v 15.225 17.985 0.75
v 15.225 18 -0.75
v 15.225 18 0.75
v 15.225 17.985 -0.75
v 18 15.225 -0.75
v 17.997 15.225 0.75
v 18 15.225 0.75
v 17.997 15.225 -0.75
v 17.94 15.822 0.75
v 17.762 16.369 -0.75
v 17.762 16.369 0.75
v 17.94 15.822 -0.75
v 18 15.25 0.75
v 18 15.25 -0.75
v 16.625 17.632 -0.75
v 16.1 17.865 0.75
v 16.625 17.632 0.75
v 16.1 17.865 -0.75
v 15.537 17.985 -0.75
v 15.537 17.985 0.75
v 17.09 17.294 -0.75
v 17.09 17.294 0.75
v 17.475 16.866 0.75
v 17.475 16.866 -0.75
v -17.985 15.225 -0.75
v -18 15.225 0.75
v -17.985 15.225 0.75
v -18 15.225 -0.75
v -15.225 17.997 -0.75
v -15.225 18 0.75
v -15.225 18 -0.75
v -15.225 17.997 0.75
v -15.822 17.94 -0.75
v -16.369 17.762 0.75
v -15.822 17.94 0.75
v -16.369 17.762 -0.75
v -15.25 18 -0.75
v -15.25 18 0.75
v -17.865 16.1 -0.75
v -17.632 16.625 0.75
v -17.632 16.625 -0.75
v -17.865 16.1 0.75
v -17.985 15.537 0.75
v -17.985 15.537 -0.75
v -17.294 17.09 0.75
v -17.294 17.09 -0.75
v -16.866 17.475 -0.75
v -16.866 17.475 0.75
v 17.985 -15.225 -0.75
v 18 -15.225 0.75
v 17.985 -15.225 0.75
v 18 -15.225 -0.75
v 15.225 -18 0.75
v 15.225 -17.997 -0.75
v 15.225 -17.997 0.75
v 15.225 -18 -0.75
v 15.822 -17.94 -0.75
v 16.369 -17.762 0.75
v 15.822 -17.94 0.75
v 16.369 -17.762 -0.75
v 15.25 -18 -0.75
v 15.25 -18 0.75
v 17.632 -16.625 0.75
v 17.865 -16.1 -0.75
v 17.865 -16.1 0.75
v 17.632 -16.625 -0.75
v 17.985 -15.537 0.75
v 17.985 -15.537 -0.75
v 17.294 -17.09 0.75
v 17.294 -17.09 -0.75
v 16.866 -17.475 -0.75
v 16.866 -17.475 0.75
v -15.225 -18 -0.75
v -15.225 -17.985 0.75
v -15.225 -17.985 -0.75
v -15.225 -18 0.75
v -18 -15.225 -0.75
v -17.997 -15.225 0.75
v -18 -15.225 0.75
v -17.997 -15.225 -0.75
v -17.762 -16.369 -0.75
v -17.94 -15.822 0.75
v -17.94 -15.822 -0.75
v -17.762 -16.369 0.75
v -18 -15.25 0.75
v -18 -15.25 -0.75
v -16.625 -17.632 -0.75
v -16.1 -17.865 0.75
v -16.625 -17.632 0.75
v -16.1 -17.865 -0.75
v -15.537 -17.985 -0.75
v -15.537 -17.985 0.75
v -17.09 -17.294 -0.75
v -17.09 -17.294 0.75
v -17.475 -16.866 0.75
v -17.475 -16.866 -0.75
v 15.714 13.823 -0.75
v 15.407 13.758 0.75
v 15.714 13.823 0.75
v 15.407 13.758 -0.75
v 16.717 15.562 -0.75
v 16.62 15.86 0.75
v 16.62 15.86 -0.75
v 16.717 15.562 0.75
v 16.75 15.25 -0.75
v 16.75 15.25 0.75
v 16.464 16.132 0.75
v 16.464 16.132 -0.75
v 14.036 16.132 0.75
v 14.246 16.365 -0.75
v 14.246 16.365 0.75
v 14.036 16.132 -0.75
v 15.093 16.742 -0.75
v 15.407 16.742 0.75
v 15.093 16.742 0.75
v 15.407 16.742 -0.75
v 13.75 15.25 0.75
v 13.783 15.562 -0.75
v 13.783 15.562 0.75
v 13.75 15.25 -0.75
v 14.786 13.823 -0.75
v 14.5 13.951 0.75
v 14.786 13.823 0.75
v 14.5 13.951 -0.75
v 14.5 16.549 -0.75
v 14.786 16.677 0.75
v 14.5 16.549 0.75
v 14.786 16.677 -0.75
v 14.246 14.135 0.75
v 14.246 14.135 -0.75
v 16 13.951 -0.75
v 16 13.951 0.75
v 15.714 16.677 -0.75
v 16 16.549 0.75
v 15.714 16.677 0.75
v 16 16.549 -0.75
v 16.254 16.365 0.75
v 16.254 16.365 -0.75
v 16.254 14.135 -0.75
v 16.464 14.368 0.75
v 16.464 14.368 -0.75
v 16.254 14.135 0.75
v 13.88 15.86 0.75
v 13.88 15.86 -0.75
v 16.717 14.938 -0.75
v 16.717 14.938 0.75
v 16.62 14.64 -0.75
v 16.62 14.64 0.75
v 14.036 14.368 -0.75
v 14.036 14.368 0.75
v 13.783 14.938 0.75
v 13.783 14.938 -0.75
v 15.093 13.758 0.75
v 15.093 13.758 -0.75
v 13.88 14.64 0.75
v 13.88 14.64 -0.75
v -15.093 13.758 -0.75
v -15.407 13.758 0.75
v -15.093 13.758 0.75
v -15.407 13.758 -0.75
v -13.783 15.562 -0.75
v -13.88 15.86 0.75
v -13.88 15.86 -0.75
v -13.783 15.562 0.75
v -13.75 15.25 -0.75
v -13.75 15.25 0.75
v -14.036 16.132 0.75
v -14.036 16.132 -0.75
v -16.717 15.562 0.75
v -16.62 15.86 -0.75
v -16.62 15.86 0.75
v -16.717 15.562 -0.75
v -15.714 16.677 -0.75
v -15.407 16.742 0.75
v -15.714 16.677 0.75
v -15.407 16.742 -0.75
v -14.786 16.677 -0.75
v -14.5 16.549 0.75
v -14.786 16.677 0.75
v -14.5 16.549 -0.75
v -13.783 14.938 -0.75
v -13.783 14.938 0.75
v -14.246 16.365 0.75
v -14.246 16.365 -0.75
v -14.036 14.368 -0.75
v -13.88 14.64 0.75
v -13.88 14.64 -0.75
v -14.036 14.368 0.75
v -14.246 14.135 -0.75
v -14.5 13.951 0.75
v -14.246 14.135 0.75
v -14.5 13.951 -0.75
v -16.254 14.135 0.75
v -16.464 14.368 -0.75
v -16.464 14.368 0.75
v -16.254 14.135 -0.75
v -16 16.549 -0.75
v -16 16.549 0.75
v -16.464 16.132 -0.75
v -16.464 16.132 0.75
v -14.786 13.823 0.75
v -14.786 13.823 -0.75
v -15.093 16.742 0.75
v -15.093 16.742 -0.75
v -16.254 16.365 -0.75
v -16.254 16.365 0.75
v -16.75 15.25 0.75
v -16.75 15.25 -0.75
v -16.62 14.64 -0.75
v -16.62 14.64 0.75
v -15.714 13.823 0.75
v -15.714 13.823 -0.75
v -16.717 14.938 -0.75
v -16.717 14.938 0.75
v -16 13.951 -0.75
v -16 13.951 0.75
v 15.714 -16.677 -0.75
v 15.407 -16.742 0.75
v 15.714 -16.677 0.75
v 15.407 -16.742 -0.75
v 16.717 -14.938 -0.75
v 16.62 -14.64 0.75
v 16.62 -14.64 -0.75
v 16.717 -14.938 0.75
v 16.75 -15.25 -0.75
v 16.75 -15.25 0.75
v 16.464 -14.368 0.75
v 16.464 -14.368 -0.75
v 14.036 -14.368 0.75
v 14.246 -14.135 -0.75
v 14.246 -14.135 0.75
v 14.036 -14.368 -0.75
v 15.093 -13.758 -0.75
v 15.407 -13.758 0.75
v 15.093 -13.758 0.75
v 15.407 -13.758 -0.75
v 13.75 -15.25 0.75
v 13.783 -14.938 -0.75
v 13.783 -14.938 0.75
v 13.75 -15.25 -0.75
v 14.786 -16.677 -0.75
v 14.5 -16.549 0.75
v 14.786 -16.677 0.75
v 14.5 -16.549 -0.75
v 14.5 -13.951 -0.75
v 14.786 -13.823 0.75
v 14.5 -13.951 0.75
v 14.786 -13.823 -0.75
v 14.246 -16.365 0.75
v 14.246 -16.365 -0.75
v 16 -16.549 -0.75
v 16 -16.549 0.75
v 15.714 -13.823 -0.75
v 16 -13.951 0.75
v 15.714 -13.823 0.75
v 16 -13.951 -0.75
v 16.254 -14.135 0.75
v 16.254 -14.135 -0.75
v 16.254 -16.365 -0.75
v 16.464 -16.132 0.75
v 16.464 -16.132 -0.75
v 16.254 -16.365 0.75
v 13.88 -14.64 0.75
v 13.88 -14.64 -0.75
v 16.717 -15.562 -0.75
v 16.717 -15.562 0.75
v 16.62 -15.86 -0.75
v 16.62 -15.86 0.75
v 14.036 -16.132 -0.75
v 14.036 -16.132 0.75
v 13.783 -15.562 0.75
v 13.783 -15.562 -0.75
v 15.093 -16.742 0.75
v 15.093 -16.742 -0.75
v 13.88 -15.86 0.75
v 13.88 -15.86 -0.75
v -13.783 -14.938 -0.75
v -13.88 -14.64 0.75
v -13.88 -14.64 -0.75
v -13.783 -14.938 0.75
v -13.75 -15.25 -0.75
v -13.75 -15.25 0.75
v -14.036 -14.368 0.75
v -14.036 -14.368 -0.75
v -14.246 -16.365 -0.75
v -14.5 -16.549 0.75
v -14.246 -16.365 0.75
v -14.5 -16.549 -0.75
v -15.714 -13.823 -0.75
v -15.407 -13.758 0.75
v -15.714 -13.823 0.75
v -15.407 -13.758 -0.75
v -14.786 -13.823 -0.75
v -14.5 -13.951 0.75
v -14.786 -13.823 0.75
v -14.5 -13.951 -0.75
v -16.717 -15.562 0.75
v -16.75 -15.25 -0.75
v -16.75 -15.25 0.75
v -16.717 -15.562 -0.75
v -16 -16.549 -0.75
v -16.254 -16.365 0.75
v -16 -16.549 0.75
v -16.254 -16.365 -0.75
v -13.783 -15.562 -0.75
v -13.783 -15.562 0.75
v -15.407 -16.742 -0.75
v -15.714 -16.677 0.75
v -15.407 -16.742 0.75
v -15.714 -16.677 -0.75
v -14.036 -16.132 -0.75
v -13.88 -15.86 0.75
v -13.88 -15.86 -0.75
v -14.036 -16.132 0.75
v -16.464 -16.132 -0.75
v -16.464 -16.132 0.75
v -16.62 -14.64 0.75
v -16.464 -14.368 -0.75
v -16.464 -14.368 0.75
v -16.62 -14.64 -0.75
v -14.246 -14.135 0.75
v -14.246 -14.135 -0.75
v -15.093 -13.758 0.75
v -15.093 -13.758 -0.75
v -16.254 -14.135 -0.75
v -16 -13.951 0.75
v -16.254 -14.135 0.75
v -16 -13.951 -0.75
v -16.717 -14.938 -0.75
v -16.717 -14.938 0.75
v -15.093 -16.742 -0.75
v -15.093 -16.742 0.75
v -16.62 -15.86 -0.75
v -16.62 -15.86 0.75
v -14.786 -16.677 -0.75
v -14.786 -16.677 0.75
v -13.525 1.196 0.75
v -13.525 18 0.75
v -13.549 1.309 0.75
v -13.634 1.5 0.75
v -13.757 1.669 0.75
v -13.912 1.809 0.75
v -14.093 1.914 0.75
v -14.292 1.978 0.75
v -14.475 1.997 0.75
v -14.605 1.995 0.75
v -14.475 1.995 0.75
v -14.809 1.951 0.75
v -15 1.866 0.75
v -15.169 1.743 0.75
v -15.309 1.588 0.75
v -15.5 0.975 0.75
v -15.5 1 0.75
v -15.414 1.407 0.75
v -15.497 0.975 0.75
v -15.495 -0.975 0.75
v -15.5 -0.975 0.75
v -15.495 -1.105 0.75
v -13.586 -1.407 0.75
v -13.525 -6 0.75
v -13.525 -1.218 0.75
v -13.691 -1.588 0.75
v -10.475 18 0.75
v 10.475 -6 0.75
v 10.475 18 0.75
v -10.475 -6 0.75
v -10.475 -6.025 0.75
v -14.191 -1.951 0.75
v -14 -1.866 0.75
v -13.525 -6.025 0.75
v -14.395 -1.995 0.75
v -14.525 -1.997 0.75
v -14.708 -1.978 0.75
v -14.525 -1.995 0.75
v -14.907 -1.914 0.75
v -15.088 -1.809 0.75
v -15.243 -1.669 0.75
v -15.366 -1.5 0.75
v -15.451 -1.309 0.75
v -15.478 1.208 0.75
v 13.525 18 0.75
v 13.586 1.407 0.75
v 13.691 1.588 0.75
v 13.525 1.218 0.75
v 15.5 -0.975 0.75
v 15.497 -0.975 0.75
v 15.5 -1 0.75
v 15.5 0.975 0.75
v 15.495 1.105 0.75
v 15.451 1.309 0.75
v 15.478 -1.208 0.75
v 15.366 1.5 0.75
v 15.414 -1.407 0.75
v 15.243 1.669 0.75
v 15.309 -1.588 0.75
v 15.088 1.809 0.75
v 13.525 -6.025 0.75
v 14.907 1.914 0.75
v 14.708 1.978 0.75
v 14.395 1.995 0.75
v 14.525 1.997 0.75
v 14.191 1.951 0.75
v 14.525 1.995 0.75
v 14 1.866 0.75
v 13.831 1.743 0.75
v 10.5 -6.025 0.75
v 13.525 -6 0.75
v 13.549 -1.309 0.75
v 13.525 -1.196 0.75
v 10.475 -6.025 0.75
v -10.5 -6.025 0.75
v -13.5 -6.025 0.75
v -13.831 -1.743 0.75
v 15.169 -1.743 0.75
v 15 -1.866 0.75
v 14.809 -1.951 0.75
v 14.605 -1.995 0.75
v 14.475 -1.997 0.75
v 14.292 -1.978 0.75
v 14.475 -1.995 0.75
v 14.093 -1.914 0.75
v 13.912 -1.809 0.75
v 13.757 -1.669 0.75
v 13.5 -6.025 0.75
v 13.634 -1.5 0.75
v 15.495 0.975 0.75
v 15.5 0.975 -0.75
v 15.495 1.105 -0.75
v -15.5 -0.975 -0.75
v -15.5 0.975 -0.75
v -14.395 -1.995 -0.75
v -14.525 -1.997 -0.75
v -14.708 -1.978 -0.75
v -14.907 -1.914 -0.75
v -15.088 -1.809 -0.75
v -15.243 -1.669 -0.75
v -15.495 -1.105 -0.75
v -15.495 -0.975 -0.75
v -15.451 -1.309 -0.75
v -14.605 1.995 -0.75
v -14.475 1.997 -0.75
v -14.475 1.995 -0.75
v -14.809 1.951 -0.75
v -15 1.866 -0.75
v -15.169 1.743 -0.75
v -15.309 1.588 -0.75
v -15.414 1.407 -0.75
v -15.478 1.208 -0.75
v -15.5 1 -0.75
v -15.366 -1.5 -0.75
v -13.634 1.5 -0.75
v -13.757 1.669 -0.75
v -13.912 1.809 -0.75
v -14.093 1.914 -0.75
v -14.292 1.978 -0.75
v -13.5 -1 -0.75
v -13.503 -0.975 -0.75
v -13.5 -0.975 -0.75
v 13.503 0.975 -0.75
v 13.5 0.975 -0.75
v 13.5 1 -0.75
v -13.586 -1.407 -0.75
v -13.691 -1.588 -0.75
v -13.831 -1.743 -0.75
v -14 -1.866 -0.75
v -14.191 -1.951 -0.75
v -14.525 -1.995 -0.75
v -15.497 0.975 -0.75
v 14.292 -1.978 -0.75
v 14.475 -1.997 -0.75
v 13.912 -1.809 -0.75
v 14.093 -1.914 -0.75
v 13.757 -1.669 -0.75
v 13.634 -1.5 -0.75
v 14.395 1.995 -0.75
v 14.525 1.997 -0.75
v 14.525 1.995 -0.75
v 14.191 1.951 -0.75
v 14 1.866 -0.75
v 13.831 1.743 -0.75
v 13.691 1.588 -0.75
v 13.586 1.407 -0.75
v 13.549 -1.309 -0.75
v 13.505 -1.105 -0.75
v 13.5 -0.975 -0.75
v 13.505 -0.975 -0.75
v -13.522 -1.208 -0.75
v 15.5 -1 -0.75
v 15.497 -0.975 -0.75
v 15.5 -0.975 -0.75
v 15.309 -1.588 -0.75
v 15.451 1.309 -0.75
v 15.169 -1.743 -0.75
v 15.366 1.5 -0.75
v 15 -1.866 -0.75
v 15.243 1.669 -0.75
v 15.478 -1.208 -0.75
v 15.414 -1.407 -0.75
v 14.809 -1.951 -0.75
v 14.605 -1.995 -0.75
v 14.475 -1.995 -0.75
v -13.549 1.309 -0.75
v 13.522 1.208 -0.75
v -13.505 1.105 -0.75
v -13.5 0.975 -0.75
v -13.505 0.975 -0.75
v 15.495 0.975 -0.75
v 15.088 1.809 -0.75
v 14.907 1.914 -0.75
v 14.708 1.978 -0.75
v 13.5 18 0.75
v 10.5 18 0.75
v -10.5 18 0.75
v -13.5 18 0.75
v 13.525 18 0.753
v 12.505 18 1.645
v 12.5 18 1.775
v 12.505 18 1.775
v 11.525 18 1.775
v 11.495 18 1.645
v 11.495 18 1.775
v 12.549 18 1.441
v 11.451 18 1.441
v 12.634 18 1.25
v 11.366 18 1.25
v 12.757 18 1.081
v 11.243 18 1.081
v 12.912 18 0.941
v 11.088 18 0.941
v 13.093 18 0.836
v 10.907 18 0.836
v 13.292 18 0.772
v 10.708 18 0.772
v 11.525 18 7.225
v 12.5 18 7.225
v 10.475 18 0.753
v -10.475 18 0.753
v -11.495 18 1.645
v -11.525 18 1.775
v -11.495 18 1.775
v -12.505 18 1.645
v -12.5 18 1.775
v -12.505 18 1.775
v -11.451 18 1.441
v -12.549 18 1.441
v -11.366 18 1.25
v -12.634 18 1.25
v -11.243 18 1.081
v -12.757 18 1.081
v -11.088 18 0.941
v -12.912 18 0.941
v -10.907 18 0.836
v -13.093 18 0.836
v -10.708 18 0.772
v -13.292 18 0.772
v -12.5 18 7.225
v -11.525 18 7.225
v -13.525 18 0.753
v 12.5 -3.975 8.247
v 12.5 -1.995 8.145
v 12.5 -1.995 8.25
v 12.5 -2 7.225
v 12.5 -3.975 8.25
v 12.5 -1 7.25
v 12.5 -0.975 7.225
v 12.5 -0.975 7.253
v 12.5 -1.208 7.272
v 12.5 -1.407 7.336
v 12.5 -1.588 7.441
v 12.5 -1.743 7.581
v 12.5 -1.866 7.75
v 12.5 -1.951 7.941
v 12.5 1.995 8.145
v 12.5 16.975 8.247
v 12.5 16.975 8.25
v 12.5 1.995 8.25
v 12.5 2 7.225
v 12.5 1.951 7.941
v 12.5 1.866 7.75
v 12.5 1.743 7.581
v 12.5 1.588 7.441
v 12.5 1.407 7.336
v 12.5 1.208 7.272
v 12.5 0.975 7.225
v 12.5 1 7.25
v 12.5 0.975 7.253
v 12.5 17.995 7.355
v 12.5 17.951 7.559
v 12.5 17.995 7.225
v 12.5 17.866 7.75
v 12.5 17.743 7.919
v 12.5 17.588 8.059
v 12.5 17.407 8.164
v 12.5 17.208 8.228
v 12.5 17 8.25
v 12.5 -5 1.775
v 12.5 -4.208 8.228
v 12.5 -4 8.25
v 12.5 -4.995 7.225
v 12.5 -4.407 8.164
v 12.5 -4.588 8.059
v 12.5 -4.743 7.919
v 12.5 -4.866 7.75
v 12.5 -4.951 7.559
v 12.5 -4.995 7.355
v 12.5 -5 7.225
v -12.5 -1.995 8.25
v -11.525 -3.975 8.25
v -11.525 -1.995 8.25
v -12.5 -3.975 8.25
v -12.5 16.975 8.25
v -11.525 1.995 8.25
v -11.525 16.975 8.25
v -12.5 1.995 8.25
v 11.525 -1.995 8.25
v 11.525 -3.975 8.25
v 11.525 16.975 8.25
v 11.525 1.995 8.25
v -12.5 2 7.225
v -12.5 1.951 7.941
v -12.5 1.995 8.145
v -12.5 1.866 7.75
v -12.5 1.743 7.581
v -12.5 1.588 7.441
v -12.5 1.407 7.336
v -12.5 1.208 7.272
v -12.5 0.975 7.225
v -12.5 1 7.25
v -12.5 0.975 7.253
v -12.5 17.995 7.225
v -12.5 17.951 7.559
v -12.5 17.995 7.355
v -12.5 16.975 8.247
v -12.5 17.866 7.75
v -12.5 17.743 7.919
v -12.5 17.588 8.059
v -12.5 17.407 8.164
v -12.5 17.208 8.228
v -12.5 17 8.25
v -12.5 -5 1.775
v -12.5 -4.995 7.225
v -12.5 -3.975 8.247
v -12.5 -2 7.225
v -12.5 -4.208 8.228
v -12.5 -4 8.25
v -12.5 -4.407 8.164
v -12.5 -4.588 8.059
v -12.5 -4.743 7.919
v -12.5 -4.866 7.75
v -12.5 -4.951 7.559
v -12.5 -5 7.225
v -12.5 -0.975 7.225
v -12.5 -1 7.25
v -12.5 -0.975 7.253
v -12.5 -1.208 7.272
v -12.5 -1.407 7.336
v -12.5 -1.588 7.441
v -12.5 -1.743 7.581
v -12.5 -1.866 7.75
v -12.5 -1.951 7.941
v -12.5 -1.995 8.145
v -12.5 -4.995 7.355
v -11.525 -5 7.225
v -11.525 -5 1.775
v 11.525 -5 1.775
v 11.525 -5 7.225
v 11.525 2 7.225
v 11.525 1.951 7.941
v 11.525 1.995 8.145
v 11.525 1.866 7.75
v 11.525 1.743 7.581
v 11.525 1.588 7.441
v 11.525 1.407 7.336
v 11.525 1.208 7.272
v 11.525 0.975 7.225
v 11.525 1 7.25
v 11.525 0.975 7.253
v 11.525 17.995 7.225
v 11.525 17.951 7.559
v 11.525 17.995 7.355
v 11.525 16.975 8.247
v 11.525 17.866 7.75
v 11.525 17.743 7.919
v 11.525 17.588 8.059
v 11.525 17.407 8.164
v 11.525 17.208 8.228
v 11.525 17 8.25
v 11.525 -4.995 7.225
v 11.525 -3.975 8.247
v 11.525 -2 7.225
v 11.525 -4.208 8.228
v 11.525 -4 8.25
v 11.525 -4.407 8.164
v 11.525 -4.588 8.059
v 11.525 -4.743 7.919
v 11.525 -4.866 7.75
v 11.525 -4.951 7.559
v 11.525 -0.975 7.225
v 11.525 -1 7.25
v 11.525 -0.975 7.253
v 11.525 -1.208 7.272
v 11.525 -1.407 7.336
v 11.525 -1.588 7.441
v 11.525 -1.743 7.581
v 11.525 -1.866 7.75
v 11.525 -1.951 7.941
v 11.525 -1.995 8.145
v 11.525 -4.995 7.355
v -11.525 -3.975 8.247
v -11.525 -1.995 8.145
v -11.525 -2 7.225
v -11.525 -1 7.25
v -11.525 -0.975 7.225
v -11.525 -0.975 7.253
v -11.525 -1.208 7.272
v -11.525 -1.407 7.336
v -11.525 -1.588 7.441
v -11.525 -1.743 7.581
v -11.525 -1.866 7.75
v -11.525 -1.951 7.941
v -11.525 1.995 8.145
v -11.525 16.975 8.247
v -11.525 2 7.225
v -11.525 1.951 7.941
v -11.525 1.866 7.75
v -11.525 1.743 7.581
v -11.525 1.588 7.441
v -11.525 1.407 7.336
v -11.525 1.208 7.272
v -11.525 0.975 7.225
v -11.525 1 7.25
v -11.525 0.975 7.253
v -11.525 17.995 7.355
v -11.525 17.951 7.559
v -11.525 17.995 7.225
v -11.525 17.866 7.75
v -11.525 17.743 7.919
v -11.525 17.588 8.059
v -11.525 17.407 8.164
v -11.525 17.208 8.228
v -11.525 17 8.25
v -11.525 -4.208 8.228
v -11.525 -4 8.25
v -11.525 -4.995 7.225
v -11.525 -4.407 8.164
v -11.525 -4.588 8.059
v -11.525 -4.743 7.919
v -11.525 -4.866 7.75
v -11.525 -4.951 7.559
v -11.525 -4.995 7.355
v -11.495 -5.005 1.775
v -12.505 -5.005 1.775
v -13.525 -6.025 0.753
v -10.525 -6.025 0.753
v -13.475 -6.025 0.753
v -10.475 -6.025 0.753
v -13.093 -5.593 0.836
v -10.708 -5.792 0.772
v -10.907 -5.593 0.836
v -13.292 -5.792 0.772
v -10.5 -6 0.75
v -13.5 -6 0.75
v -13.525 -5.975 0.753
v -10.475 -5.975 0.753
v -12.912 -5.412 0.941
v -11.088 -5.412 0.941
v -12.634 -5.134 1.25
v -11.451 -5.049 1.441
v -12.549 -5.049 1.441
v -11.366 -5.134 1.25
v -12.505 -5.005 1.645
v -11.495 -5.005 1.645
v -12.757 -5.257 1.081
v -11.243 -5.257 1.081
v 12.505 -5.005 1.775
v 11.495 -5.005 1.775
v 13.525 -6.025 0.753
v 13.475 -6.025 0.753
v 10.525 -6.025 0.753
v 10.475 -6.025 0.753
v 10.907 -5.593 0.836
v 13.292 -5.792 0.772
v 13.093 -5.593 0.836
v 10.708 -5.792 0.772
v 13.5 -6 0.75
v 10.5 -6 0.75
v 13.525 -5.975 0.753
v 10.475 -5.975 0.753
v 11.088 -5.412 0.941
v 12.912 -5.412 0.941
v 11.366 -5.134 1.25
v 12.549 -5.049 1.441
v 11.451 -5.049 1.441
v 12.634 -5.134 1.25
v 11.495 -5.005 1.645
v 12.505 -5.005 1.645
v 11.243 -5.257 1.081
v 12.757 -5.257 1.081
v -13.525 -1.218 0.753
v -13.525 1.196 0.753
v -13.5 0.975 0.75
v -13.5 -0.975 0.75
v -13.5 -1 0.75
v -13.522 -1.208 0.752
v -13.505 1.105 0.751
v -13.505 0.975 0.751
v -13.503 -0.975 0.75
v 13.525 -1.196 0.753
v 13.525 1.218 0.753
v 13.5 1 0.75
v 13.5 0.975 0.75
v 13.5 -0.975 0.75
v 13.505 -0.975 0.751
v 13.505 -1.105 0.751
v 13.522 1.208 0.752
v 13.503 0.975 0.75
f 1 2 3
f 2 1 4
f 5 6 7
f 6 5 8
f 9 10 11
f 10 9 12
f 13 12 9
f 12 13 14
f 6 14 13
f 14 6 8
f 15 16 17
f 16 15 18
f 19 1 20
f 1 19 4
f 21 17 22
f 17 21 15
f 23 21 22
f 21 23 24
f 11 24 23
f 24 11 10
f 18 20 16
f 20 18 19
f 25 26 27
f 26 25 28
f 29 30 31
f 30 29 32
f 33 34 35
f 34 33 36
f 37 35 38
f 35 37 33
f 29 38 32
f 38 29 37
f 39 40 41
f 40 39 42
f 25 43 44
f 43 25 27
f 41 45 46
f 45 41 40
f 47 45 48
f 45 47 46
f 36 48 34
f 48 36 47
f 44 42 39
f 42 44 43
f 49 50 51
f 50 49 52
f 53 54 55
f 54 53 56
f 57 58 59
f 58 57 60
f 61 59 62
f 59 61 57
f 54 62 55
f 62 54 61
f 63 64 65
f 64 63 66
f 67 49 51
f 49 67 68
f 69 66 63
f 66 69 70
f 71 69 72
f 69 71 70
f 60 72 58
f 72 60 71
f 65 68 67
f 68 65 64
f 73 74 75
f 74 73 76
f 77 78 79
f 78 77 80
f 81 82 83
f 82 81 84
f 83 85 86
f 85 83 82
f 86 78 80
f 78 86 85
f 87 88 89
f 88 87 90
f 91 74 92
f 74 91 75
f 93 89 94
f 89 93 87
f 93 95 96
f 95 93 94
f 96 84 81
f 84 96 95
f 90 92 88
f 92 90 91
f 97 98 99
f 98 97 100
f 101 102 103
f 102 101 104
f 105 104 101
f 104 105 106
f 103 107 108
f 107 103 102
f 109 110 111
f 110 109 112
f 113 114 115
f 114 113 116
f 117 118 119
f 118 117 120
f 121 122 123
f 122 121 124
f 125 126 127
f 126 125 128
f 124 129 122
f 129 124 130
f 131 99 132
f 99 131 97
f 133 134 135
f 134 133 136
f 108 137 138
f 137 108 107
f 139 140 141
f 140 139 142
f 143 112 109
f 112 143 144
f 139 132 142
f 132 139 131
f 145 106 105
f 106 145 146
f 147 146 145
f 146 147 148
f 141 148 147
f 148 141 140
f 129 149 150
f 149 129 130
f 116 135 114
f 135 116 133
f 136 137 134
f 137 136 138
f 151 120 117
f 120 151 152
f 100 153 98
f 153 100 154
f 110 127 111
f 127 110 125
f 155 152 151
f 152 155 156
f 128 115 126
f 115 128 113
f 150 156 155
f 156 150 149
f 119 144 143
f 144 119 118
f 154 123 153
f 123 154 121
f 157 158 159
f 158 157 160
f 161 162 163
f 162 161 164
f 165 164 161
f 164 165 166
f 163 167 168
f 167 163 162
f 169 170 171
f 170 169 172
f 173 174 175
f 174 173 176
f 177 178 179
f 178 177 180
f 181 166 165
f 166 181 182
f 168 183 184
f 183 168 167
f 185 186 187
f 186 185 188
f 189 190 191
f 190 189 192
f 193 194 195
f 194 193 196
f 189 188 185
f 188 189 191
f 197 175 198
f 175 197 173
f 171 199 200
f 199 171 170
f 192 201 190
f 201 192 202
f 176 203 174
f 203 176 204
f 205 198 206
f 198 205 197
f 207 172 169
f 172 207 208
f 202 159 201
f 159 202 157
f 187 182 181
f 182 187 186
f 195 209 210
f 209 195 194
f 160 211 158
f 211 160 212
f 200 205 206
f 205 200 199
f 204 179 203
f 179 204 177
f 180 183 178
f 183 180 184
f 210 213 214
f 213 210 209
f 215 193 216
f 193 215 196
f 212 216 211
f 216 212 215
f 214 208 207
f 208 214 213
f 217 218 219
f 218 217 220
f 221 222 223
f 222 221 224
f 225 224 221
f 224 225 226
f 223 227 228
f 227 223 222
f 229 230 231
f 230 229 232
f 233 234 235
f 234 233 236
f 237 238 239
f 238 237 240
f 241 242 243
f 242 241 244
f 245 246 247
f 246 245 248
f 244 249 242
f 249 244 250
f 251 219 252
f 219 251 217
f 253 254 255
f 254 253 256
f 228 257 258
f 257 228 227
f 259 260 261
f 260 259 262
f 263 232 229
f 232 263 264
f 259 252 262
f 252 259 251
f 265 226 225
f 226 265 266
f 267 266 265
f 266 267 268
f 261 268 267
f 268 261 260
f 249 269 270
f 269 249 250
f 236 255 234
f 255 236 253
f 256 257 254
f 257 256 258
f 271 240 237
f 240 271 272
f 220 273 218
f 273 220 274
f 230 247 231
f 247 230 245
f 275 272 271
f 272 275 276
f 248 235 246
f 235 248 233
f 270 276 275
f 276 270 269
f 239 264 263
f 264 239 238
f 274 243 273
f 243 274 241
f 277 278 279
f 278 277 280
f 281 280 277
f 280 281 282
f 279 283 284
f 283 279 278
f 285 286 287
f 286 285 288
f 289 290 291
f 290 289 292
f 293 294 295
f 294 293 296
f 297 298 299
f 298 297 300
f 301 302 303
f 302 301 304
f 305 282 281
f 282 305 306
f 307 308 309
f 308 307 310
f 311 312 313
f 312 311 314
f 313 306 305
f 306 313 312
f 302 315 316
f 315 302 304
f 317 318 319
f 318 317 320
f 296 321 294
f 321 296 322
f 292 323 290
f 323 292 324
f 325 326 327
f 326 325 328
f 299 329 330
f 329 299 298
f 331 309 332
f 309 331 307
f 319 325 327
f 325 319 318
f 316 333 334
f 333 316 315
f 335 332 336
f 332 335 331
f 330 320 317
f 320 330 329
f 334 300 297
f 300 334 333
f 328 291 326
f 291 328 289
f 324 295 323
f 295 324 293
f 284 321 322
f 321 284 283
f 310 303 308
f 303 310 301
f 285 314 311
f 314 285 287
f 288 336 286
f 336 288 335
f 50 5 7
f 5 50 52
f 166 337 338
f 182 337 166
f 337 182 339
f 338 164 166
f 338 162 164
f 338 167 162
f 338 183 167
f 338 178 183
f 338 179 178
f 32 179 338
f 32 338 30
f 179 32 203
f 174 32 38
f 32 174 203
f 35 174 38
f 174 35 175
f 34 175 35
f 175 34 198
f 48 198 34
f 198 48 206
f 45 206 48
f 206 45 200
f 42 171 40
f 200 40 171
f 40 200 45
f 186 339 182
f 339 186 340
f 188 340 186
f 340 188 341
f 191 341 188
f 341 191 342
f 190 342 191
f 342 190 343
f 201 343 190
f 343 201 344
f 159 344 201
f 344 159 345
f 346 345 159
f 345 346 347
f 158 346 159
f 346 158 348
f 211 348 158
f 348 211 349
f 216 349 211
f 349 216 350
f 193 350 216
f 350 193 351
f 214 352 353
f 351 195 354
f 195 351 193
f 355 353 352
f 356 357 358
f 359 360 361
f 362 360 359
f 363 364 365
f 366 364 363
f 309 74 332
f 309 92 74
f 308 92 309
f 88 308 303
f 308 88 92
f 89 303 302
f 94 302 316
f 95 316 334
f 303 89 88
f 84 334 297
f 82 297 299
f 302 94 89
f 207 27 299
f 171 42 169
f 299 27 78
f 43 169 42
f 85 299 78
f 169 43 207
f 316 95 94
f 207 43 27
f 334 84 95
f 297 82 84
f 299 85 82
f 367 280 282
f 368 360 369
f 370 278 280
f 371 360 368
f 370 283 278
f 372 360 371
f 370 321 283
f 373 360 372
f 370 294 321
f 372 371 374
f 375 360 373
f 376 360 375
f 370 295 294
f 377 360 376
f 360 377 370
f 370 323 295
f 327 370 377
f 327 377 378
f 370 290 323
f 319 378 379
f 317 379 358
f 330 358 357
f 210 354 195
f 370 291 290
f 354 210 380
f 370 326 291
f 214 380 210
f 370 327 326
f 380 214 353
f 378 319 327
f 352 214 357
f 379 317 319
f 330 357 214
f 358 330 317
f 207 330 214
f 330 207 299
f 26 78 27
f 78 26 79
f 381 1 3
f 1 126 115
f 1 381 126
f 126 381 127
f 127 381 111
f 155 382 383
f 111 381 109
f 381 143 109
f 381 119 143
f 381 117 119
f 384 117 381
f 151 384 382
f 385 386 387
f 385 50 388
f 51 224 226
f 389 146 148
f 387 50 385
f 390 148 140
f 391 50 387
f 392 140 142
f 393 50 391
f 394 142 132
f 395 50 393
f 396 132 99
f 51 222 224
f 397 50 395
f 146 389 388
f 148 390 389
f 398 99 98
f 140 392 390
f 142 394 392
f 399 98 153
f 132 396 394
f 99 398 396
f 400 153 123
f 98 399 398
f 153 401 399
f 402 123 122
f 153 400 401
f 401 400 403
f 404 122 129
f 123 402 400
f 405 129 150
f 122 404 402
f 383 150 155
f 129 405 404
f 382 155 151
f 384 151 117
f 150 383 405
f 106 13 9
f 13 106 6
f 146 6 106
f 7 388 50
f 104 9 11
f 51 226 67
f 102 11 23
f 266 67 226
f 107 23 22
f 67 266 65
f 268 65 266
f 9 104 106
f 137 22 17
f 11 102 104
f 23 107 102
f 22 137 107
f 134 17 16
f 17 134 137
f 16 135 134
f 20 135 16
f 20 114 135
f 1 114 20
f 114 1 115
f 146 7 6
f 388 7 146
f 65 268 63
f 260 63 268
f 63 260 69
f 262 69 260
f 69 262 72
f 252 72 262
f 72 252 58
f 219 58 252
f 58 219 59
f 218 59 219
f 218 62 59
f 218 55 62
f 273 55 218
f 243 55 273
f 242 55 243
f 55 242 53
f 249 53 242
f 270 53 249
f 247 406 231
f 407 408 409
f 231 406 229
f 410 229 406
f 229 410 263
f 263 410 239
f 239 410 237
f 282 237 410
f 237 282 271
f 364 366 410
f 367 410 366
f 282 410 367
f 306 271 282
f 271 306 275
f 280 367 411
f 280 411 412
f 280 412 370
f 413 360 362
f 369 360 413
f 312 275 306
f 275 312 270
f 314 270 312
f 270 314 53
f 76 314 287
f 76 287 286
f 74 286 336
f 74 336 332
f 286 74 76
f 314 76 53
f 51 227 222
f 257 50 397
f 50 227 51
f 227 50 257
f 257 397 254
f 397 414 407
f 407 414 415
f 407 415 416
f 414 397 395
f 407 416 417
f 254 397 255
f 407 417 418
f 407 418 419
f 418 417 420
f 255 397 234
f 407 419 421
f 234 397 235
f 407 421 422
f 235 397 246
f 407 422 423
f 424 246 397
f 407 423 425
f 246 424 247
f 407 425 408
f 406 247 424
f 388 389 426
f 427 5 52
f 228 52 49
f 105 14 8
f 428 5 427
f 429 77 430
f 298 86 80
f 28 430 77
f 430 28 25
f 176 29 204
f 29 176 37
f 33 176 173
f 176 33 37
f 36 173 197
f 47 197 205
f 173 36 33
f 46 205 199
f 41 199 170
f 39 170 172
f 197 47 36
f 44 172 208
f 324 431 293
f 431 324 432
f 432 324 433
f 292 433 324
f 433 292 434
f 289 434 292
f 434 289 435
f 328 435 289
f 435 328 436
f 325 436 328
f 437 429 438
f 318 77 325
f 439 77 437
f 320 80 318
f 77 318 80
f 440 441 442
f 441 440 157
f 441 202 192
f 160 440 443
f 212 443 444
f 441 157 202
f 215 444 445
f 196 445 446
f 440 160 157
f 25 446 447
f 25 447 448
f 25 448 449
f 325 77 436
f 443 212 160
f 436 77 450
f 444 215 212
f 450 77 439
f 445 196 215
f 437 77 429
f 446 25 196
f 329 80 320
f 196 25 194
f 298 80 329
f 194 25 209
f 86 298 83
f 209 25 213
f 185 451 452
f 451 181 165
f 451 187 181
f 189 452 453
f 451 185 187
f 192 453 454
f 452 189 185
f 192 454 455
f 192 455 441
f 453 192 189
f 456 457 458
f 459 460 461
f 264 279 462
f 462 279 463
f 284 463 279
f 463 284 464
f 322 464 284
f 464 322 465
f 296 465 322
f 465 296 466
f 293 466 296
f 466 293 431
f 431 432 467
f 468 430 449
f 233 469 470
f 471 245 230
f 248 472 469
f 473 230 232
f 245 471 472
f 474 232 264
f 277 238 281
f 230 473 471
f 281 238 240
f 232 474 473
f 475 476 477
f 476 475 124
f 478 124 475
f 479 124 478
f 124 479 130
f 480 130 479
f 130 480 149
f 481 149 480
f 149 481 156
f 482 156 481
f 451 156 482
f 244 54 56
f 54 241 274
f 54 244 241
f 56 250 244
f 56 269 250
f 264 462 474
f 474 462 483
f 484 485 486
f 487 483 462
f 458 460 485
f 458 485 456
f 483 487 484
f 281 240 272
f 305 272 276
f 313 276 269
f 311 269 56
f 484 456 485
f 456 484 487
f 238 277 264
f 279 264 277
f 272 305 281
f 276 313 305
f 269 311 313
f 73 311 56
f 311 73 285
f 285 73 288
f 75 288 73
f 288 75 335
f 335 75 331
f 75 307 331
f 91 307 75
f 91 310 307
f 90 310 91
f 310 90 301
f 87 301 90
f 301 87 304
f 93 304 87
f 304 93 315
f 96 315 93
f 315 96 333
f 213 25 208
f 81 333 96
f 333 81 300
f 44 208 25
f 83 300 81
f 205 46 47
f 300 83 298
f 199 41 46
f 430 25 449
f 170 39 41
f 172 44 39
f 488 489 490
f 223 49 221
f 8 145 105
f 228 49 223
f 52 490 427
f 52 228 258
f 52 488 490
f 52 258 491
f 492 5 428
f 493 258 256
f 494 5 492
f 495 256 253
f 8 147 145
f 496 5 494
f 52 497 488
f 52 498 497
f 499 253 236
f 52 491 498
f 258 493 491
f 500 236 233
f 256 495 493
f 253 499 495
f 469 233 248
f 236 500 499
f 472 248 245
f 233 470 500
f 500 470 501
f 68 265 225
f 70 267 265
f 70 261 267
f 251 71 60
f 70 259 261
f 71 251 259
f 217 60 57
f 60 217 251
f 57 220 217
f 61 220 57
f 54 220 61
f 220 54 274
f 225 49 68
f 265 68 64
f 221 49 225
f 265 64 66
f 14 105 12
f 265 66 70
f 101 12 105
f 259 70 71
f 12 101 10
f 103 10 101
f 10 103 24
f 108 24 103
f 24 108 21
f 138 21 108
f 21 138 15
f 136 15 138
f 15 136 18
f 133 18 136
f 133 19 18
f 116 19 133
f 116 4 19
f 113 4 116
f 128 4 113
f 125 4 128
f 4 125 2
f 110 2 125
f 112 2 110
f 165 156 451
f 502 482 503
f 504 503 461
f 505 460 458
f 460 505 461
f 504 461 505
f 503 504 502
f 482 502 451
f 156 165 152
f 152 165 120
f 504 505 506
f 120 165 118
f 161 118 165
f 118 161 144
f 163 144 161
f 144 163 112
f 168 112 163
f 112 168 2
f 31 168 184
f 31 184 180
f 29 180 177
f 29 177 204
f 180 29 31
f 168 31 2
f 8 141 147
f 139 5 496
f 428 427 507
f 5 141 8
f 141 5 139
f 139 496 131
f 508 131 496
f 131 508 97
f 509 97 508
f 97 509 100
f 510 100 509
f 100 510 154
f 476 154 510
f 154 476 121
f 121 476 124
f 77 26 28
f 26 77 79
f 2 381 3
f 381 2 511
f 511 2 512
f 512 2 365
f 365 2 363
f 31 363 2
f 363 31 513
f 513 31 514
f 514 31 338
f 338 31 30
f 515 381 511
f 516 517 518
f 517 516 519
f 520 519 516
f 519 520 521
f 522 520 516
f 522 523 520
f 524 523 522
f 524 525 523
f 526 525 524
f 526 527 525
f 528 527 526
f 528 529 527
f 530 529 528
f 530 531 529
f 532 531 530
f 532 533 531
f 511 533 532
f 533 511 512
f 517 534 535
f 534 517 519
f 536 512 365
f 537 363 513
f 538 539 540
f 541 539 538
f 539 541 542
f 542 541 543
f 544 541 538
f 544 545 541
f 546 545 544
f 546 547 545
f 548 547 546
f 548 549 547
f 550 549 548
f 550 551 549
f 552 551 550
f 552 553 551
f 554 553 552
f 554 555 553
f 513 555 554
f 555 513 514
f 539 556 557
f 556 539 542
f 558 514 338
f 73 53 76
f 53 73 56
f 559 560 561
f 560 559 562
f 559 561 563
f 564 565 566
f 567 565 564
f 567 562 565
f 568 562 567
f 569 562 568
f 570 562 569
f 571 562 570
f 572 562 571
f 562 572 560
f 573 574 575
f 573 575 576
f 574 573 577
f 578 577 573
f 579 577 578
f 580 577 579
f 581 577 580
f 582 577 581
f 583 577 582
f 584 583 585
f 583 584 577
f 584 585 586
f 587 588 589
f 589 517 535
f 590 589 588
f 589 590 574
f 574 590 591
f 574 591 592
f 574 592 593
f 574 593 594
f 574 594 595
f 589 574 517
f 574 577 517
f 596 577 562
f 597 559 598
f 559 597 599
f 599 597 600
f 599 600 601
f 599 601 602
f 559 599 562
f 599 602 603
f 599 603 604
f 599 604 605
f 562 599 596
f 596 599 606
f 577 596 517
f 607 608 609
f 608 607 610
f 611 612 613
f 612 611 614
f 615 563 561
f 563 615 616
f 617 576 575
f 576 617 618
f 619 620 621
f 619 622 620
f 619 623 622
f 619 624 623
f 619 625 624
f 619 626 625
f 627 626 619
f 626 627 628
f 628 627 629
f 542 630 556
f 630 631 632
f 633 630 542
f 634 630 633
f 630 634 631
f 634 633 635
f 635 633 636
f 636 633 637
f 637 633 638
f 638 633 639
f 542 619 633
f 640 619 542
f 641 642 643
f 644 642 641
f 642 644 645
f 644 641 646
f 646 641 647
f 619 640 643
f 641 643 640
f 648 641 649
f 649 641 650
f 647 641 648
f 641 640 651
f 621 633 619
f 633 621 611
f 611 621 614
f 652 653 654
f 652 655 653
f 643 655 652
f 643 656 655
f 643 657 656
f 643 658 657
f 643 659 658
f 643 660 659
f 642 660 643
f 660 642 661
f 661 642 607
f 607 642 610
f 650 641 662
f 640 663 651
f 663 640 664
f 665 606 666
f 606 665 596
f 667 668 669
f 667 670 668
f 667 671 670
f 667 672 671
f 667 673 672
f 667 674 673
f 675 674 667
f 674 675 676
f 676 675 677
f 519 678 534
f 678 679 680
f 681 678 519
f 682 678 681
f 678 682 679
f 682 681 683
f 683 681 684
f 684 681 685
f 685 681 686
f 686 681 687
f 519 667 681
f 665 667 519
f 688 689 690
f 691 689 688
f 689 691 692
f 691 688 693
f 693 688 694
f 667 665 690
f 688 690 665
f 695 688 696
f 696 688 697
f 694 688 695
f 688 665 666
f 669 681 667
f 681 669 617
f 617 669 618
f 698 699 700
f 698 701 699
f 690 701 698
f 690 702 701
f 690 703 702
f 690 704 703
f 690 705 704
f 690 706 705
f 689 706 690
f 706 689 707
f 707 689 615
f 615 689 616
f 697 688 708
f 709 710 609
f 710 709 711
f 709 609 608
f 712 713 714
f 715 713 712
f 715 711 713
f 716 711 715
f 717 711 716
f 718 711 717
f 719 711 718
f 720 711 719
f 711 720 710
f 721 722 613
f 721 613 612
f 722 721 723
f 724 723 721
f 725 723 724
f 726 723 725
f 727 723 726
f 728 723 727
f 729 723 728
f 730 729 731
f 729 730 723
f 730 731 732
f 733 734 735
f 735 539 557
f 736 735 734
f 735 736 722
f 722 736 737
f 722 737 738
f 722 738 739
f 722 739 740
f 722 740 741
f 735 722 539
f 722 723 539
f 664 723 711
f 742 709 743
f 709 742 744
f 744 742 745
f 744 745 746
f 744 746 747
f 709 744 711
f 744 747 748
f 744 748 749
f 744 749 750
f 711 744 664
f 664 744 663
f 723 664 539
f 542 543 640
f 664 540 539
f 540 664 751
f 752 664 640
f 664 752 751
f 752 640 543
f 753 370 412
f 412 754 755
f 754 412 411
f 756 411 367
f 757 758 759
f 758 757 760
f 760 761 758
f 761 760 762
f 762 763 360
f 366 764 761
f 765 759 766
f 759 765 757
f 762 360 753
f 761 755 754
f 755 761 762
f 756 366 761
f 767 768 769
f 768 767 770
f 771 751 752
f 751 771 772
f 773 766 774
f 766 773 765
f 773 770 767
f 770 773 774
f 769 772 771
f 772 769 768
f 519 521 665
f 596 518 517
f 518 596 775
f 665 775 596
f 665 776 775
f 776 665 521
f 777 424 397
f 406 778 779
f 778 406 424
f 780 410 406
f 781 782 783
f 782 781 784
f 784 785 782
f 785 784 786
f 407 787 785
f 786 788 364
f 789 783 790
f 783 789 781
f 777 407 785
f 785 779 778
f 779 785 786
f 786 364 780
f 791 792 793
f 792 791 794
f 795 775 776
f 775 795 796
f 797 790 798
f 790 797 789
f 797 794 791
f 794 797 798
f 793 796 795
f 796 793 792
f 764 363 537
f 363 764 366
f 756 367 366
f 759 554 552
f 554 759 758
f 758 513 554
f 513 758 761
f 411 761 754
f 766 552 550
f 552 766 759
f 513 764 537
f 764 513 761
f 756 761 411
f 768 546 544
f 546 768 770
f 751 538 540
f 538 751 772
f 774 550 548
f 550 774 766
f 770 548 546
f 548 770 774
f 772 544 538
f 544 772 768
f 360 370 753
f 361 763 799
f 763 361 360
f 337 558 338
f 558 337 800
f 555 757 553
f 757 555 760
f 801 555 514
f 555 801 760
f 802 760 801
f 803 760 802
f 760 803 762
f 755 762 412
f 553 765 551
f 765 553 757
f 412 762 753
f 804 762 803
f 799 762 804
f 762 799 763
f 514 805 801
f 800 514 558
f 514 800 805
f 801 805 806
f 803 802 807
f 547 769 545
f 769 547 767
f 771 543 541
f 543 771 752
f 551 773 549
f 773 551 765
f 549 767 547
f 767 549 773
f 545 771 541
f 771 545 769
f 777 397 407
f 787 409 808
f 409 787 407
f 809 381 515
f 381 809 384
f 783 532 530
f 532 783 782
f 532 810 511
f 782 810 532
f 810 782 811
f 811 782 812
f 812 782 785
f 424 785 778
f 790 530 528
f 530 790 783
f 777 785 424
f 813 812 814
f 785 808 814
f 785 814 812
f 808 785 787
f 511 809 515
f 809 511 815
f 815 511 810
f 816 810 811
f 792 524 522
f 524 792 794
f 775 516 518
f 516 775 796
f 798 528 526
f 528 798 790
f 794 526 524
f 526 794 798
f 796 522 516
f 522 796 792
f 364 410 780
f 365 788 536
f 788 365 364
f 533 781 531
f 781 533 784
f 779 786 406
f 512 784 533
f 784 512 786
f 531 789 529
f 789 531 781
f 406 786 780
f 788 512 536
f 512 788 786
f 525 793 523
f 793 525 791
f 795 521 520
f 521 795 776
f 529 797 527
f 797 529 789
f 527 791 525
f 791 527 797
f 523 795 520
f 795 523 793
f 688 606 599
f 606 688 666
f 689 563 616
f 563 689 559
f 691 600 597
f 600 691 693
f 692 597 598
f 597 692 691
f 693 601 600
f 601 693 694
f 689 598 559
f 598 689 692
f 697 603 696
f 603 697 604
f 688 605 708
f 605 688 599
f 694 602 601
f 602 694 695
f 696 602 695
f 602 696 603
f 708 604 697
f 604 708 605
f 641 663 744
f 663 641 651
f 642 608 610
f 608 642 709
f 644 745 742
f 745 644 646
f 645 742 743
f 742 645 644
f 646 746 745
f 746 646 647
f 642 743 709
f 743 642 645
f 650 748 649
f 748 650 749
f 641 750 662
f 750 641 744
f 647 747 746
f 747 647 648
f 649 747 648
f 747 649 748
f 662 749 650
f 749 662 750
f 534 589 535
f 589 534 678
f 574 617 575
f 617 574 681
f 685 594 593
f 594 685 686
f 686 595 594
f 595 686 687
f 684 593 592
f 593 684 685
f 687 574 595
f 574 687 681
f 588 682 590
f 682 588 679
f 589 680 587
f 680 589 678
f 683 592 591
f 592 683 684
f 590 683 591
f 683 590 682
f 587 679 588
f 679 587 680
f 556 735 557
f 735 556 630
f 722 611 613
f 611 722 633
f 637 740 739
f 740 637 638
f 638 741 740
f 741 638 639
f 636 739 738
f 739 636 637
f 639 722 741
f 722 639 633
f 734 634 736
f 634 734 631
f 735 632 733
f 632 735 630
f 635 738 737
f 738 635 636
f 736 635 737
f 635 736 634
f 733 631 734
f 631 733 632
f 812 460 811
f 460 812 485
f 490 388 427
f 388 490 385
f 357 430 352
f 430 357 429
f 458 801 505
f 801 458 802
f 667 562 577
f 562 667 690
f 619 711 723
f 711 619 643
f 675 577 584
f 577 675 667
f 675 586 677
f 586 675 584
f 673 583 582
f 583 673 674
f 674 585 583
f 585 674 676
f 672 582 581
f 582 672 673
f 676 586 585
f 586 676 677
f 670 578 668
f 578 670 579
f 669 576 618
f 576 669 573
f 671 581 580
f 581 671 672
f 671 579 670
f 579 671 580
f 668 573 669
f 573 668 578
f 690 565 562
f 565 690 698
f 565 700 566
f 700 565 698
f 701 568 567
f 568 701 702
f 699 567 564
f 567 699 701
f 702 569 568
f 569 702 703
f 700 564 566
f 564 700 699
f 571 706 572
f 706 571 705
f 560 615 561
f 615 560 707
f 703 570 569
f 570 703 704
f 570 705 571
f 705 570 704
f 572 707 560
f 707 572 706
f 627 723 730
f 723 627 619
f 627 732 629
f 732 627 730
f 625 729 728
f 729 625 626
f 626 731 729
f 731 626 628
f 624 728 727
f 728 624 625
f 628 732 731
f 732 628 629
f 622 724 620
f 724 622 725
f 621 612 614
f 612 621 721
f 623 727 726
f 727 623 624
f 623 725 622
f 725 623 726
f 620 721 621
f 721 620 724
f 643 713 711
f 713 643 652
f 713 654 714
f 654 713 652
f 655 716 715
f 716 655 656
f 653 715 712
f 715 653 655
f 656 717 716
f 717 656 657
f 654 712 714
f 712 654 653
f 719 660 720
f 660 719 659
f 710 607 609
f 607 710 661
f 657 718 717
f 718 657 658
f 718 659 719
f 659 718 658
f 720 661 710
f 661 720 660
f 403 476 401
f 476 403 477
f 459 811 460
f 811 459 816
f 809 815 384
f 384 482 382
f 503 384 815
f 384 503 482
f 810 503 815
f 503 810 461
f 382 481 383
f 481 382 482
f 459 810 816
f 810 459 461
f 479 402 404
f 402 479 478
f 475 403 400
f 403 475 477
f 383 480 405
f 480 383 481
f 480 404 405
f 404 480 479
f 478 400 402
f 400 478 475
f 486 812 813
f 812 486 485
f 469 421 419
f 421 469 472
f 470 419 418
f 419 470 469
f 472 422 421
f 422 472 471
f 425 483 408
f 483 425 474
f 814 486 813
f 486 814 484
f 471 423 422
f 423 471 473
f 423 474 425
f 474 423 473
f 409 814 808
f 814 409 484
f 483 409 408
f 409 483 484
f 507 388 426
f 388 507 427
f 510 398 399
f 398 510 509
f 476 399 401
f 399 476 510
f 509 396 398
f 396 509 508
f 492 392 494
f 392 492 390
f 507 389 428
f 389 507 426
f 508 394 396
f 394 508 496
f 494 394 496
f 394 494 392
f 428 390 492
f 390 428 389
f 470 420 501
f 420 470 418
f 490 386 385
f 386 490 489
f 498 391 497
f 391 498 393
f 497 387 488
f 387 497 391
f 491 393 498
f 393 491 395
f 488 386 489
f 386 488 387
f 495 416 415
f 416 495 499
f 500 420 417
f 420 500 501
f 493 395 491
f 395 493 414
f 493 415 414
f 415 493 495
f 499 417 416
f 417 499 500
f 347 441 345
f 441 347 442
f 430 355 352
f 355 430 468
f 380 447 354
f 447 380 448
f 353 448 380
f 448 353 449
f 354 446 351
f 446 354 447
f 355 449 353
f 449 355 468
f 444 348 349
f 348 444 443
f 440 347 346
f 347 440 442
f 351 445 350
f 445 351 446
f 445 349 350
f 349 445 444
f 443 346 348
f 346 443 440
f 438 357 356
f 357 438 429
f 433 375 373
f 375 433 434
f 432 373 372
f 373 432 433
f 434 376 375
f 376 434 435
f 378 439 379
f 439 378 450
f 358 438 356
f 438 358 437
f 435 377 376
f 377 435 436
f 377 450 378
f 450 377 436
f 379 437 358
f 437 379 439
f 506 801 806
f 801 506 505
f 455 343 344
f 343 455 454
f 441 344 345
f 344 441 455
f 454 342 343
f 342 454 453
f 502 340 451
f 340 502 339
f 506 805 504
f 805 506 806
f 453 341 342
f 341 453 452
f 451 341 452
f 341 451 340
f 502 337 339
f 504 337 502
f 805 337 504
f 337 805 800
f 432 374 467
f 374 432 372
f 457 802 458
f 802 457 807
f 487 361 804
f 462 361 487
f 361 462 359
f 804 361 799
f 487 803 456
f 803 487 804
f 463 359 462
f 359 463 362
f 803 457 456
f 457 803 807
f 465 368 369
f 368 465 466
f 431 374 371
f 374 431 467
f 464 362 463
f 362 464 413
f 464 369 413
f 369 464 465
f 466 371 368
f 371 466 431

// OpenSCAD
base_size = 36;
hole_spacing = 30.5;
mounting_hole_radius = 1.5;
base_thickness = 1.5;
receiver_width = 23;
receiver_length = 23;
receiver_height = 7.5;
wall_thickness = 1;
zip_tie_center = 18; //from back
zip_tie_length = 4;
zip_tie_width = 2;
bevel_radius = 1;

$fs = 0.05;

module bevel(r, l) {
    translate([-r, -r, 0]) {
        difference() {
            translate([r/2, r/2, 0]) {
                cube([r+$fs, r+$fs, l+$fs], center=true);
            }
            cylinder(r=r, h=l+$fs*2, center=true);
        }
    }
}

module bevel_trans(r, l, tr, rot) {
    translate(tr) {
        rotate(rot) {
            bevel(r=r, l=l);
        }
    }    
}

module mounting_hole(x, y, s, r, t) {
    translate([s/2*x, s/2*y, 0]) {
        cylinder(r=r, h=t+$fs, center=true);
    }
}
module base(b, s, r, t) {
    difference() {
        cube([b, b, t], center=true);
        union() {
            mounting_hole(1, 1, s, r, t);
            mounting_hole(-1, 1, s, r, t);
            mounting_hole(1, -1, s, r, t);
            mounting_hole(-1, -1, s, r, t);
            br = (b-s)/2;
            bevel_trans(tr=[b/2, b/2, 0], rot=[0, 0, 0], r=br, l=t+$fs);
            bevel_trans(tr=[-b/2, b/2, 0], rot=[0, 0, 90], r=br, l=t+$fs);
            bevel_trans(tr=[b/2, -b/2, 0], rot=[0, 0, -90], r=br, l=t+$fs);
            bevel_trans(tr=[-b/2, -b/2, 0], rot=[0, 0, 180], r=br, l=t+$fs);
        }
    }
}

module walls(b, l, w, h, t, bt, br) {
    difference() {
        union() {
            translate([0, (b-l)/2, (h+bt)/2]) {
                difference() {
                    cube([w+(t*2), l, h], center=true);
                    cube([w+$fs, l+$fs, h+$fs], center=true);
                }
            }
            //bottom short bevel
            bevel_trans(tr=[-(w+t)/2, b/2-l, bt/2], rot=[0, 90, 0], r=br, l=t-$fs);
            bevel_trans(tr=[(w+t)/2, b/2-l, bt/2], rot=[0, 90, 0], r=br, l=t-$fs);
            
            //bottom long bevel
            bevel_trans(tr=[-w/2, (b-l)/2, bt/2], rot=[0, 90, 90], r=br, l=l-$fs);
            bevel_trans(tr=[-(w/2+t), (b-l)/2, bt/2], rot=[0, 90, -90], r=br, l=l-$fs);
            bevel_trans(tr=[w/2+t, (b-l)/2, bt/2], rot=[0, 90, 90], r=br, l=l-$fs);
            bevel_trans(tr=[w/2, (b-l)/2, bt/2], rot=[0, 90, -90], r=br, l=l-$fs);
            
            //wrap around bevels
            intersection() {
                bevel_trans(tr=[-(w+t)/2, b/2-l, bt/2], rot=[0, 90, 0], r=br, l=t*4);
                bevel_trans(tr=[-w/2, (b-l)/2, bt/2], rot=[0, 90, 90], r=br, l=l*2);
            }
            intersection() {
                bevel_trans(tr=[-(w+t)/2, b/2-l, bt/2], rot=[0, 90, 0], r=br, l=t*4);
                bevel_trans(tr=[-(w/2+t), (b-l)/2, bt/2], rot=[0, 90, -90], r=br, l=l*2);
            }
            intersection() {
                bevel_trans(tr=[(w+t)/2, b/2-l, bt/2], rot=[0, 90, 0], r=br, l=t*4);
                bevel_trans(tr=[w/2+t, (b-l)/2, bt/2], rot=[0, 90, 90], r=br, l=l*2);
            }
            intersection() {
                bevel_trans(tr=[(w+t)/2, b/2-l, bt/2], rot=[0, 90, 0], r=br, l=t*4);
                bevel_trans(tr=[w/2, (b-l)/2, bt/2], rot=[0, 90, -90], r=br, l=l*2);
            }

        }
        //top bevel
        bevel_trans(tr=[(w+t)/2, b/2-l, bt/2+h], rot=[0, -90, 180], r=br, l=t+$fs);
        bevel_trans(tr=[-(w+t)/2, b/2-l, bt/2+h], rot=[0, -90, 180], r=br, l=t+$fs);
        bevel_trans(tr=[(w+t)/2, b/2, bt/2+h], rot=[0, -90, 0], r=br, l=t+$fs);
        bevel_trans(tr=[-(w+t)/2, b/2, bt/2+h], rot=[0, -90, 0], r=br, l=t+$fs);
    }
}
module zip_tie_holes(b, c, l, w, rw, rh, t, bt, br) {
    difference() {
        union() {
            translate([rw/2+w/2+t+br, b/2-c, 0]) {
                rotate([0, 0, 90]) {
                    cube([l, w, bt+$fs], center=true);
                }
            }
            translate([-(rw/2+w/2+t+br), b/2-c, 0]) {
                rotate([0, 0, 90]) {
                    cube([l, w, bt+$fs], center=true);
                }
            }
            translate([rw/2+t/2, b/2-c, bt/2+rh-t/2]) {
                rotate([0, 0, 90]) {
                    cube([l, t+$fs, t+$fs], center=true);
                }
            }
            translate([-(rw/2+t/2), b/2-c, bt/2+rh-t/2]) {
                rotate([0, 0, 90]) {
                    cube([l, t+$fs, t+$fs], center=true);
                }
            }
        }
        //top bevels
        bevel_trans(tr=[rw/2+t/2, b/2-c+l/2, bt/2+rh-t], rot=[0, 90, 0], r=br, l=t+$fs);
        bevel_trans(tr=[rw/2+t/2, b/2-c-l/2, bt/2+rh-t], rot=[0, 90, 180], r=br, l=t+$fs);
        bevel_trans(tr=[-(rw/2+t/2), b/2-c+l/2, bt/2+rh-t], rot=[0, 90, 0], r=br, l=t+$fs);
        bevel_trans(tr=[-(rw/2+t/2), b/2-c-l/2, bt/2+rh-t], rot=[0, 90, 180], r=br, l=t+$fs);
        
        //bottom bevels
        bevel_trans(tr=[rw/2+w/2+br, b/2-c+l/2, 0], rot=[0, 180, 0], r=br, l=bt+$fs);
        bevel_trans(tr=[rw/2+w/2+br, b/2-c-l/2, 0], rot=[0, 180, 90], r=br, l=bt+$fs);
        bevel_trans(tr=[rw/2+w/2+br+w, b/2-c+l/2, 0], rot=[0, 180, -90], r=br, l=bt+$fs);
        bevel_trans(tr=[rw/2+w/2+br+w, b/2-c-l/2, 0], rot=[0, 180, 180], r=br, l=bt+$fs);
        
        bevel_trans(tr=[-(rw/2+w/2+br+w), b/2-c+l/2, 0], rot=[0, 180, 0], r=br, l=bt+$fs);
        bevel_trans(tr=[-(rw/2+w/2+br+w), b/2-c-l/2, 0], rot=[0, 180, 90], r=br, l=bt+$fs);
        bevel_trans(tr=[-(rw/2+w/2+br), b/2-c+l/2, 0], rot=[0, 180, -90], r=br, l=bt+$fs);
        bevel_trans(tr=[-(rw/2+w/2+br), b/2-c-l/2, 0], rot=[0, 180, 180], r=br, l=bt+$fs);
    }
}
module component(base_size, hole_spacing, mounting_hole_radius, base_thickness, receiver_width, receiver_length, receiver_height, wall_thickness, zip_tie_center, zip_tie_length, zip_tie_width, bevel_radius) {
    difference() {
        union() {
            base(base_size, hole_spacing, mounting_hole_radius, base_thickness);
            walls(base_size, receiver_length, receiver_width, receiver_height, wall_thickness, base_thickness, bevel_radius);
        }
        zip_tie_holes(base_size, zip_tie_center, zip_tie_length, zip_tie_width, receiver_width, receiver_height, wall_thickness, base_thickness, bevel_radius);
    }
}


component(base_size, hole_spacing, mounting_hole_radius, base_thickness, receiver_width, receiver_length, receiver_height, wall_thickness, zip_tie_center, zip_tie_length, zip_tie_width, bevel_radius);
